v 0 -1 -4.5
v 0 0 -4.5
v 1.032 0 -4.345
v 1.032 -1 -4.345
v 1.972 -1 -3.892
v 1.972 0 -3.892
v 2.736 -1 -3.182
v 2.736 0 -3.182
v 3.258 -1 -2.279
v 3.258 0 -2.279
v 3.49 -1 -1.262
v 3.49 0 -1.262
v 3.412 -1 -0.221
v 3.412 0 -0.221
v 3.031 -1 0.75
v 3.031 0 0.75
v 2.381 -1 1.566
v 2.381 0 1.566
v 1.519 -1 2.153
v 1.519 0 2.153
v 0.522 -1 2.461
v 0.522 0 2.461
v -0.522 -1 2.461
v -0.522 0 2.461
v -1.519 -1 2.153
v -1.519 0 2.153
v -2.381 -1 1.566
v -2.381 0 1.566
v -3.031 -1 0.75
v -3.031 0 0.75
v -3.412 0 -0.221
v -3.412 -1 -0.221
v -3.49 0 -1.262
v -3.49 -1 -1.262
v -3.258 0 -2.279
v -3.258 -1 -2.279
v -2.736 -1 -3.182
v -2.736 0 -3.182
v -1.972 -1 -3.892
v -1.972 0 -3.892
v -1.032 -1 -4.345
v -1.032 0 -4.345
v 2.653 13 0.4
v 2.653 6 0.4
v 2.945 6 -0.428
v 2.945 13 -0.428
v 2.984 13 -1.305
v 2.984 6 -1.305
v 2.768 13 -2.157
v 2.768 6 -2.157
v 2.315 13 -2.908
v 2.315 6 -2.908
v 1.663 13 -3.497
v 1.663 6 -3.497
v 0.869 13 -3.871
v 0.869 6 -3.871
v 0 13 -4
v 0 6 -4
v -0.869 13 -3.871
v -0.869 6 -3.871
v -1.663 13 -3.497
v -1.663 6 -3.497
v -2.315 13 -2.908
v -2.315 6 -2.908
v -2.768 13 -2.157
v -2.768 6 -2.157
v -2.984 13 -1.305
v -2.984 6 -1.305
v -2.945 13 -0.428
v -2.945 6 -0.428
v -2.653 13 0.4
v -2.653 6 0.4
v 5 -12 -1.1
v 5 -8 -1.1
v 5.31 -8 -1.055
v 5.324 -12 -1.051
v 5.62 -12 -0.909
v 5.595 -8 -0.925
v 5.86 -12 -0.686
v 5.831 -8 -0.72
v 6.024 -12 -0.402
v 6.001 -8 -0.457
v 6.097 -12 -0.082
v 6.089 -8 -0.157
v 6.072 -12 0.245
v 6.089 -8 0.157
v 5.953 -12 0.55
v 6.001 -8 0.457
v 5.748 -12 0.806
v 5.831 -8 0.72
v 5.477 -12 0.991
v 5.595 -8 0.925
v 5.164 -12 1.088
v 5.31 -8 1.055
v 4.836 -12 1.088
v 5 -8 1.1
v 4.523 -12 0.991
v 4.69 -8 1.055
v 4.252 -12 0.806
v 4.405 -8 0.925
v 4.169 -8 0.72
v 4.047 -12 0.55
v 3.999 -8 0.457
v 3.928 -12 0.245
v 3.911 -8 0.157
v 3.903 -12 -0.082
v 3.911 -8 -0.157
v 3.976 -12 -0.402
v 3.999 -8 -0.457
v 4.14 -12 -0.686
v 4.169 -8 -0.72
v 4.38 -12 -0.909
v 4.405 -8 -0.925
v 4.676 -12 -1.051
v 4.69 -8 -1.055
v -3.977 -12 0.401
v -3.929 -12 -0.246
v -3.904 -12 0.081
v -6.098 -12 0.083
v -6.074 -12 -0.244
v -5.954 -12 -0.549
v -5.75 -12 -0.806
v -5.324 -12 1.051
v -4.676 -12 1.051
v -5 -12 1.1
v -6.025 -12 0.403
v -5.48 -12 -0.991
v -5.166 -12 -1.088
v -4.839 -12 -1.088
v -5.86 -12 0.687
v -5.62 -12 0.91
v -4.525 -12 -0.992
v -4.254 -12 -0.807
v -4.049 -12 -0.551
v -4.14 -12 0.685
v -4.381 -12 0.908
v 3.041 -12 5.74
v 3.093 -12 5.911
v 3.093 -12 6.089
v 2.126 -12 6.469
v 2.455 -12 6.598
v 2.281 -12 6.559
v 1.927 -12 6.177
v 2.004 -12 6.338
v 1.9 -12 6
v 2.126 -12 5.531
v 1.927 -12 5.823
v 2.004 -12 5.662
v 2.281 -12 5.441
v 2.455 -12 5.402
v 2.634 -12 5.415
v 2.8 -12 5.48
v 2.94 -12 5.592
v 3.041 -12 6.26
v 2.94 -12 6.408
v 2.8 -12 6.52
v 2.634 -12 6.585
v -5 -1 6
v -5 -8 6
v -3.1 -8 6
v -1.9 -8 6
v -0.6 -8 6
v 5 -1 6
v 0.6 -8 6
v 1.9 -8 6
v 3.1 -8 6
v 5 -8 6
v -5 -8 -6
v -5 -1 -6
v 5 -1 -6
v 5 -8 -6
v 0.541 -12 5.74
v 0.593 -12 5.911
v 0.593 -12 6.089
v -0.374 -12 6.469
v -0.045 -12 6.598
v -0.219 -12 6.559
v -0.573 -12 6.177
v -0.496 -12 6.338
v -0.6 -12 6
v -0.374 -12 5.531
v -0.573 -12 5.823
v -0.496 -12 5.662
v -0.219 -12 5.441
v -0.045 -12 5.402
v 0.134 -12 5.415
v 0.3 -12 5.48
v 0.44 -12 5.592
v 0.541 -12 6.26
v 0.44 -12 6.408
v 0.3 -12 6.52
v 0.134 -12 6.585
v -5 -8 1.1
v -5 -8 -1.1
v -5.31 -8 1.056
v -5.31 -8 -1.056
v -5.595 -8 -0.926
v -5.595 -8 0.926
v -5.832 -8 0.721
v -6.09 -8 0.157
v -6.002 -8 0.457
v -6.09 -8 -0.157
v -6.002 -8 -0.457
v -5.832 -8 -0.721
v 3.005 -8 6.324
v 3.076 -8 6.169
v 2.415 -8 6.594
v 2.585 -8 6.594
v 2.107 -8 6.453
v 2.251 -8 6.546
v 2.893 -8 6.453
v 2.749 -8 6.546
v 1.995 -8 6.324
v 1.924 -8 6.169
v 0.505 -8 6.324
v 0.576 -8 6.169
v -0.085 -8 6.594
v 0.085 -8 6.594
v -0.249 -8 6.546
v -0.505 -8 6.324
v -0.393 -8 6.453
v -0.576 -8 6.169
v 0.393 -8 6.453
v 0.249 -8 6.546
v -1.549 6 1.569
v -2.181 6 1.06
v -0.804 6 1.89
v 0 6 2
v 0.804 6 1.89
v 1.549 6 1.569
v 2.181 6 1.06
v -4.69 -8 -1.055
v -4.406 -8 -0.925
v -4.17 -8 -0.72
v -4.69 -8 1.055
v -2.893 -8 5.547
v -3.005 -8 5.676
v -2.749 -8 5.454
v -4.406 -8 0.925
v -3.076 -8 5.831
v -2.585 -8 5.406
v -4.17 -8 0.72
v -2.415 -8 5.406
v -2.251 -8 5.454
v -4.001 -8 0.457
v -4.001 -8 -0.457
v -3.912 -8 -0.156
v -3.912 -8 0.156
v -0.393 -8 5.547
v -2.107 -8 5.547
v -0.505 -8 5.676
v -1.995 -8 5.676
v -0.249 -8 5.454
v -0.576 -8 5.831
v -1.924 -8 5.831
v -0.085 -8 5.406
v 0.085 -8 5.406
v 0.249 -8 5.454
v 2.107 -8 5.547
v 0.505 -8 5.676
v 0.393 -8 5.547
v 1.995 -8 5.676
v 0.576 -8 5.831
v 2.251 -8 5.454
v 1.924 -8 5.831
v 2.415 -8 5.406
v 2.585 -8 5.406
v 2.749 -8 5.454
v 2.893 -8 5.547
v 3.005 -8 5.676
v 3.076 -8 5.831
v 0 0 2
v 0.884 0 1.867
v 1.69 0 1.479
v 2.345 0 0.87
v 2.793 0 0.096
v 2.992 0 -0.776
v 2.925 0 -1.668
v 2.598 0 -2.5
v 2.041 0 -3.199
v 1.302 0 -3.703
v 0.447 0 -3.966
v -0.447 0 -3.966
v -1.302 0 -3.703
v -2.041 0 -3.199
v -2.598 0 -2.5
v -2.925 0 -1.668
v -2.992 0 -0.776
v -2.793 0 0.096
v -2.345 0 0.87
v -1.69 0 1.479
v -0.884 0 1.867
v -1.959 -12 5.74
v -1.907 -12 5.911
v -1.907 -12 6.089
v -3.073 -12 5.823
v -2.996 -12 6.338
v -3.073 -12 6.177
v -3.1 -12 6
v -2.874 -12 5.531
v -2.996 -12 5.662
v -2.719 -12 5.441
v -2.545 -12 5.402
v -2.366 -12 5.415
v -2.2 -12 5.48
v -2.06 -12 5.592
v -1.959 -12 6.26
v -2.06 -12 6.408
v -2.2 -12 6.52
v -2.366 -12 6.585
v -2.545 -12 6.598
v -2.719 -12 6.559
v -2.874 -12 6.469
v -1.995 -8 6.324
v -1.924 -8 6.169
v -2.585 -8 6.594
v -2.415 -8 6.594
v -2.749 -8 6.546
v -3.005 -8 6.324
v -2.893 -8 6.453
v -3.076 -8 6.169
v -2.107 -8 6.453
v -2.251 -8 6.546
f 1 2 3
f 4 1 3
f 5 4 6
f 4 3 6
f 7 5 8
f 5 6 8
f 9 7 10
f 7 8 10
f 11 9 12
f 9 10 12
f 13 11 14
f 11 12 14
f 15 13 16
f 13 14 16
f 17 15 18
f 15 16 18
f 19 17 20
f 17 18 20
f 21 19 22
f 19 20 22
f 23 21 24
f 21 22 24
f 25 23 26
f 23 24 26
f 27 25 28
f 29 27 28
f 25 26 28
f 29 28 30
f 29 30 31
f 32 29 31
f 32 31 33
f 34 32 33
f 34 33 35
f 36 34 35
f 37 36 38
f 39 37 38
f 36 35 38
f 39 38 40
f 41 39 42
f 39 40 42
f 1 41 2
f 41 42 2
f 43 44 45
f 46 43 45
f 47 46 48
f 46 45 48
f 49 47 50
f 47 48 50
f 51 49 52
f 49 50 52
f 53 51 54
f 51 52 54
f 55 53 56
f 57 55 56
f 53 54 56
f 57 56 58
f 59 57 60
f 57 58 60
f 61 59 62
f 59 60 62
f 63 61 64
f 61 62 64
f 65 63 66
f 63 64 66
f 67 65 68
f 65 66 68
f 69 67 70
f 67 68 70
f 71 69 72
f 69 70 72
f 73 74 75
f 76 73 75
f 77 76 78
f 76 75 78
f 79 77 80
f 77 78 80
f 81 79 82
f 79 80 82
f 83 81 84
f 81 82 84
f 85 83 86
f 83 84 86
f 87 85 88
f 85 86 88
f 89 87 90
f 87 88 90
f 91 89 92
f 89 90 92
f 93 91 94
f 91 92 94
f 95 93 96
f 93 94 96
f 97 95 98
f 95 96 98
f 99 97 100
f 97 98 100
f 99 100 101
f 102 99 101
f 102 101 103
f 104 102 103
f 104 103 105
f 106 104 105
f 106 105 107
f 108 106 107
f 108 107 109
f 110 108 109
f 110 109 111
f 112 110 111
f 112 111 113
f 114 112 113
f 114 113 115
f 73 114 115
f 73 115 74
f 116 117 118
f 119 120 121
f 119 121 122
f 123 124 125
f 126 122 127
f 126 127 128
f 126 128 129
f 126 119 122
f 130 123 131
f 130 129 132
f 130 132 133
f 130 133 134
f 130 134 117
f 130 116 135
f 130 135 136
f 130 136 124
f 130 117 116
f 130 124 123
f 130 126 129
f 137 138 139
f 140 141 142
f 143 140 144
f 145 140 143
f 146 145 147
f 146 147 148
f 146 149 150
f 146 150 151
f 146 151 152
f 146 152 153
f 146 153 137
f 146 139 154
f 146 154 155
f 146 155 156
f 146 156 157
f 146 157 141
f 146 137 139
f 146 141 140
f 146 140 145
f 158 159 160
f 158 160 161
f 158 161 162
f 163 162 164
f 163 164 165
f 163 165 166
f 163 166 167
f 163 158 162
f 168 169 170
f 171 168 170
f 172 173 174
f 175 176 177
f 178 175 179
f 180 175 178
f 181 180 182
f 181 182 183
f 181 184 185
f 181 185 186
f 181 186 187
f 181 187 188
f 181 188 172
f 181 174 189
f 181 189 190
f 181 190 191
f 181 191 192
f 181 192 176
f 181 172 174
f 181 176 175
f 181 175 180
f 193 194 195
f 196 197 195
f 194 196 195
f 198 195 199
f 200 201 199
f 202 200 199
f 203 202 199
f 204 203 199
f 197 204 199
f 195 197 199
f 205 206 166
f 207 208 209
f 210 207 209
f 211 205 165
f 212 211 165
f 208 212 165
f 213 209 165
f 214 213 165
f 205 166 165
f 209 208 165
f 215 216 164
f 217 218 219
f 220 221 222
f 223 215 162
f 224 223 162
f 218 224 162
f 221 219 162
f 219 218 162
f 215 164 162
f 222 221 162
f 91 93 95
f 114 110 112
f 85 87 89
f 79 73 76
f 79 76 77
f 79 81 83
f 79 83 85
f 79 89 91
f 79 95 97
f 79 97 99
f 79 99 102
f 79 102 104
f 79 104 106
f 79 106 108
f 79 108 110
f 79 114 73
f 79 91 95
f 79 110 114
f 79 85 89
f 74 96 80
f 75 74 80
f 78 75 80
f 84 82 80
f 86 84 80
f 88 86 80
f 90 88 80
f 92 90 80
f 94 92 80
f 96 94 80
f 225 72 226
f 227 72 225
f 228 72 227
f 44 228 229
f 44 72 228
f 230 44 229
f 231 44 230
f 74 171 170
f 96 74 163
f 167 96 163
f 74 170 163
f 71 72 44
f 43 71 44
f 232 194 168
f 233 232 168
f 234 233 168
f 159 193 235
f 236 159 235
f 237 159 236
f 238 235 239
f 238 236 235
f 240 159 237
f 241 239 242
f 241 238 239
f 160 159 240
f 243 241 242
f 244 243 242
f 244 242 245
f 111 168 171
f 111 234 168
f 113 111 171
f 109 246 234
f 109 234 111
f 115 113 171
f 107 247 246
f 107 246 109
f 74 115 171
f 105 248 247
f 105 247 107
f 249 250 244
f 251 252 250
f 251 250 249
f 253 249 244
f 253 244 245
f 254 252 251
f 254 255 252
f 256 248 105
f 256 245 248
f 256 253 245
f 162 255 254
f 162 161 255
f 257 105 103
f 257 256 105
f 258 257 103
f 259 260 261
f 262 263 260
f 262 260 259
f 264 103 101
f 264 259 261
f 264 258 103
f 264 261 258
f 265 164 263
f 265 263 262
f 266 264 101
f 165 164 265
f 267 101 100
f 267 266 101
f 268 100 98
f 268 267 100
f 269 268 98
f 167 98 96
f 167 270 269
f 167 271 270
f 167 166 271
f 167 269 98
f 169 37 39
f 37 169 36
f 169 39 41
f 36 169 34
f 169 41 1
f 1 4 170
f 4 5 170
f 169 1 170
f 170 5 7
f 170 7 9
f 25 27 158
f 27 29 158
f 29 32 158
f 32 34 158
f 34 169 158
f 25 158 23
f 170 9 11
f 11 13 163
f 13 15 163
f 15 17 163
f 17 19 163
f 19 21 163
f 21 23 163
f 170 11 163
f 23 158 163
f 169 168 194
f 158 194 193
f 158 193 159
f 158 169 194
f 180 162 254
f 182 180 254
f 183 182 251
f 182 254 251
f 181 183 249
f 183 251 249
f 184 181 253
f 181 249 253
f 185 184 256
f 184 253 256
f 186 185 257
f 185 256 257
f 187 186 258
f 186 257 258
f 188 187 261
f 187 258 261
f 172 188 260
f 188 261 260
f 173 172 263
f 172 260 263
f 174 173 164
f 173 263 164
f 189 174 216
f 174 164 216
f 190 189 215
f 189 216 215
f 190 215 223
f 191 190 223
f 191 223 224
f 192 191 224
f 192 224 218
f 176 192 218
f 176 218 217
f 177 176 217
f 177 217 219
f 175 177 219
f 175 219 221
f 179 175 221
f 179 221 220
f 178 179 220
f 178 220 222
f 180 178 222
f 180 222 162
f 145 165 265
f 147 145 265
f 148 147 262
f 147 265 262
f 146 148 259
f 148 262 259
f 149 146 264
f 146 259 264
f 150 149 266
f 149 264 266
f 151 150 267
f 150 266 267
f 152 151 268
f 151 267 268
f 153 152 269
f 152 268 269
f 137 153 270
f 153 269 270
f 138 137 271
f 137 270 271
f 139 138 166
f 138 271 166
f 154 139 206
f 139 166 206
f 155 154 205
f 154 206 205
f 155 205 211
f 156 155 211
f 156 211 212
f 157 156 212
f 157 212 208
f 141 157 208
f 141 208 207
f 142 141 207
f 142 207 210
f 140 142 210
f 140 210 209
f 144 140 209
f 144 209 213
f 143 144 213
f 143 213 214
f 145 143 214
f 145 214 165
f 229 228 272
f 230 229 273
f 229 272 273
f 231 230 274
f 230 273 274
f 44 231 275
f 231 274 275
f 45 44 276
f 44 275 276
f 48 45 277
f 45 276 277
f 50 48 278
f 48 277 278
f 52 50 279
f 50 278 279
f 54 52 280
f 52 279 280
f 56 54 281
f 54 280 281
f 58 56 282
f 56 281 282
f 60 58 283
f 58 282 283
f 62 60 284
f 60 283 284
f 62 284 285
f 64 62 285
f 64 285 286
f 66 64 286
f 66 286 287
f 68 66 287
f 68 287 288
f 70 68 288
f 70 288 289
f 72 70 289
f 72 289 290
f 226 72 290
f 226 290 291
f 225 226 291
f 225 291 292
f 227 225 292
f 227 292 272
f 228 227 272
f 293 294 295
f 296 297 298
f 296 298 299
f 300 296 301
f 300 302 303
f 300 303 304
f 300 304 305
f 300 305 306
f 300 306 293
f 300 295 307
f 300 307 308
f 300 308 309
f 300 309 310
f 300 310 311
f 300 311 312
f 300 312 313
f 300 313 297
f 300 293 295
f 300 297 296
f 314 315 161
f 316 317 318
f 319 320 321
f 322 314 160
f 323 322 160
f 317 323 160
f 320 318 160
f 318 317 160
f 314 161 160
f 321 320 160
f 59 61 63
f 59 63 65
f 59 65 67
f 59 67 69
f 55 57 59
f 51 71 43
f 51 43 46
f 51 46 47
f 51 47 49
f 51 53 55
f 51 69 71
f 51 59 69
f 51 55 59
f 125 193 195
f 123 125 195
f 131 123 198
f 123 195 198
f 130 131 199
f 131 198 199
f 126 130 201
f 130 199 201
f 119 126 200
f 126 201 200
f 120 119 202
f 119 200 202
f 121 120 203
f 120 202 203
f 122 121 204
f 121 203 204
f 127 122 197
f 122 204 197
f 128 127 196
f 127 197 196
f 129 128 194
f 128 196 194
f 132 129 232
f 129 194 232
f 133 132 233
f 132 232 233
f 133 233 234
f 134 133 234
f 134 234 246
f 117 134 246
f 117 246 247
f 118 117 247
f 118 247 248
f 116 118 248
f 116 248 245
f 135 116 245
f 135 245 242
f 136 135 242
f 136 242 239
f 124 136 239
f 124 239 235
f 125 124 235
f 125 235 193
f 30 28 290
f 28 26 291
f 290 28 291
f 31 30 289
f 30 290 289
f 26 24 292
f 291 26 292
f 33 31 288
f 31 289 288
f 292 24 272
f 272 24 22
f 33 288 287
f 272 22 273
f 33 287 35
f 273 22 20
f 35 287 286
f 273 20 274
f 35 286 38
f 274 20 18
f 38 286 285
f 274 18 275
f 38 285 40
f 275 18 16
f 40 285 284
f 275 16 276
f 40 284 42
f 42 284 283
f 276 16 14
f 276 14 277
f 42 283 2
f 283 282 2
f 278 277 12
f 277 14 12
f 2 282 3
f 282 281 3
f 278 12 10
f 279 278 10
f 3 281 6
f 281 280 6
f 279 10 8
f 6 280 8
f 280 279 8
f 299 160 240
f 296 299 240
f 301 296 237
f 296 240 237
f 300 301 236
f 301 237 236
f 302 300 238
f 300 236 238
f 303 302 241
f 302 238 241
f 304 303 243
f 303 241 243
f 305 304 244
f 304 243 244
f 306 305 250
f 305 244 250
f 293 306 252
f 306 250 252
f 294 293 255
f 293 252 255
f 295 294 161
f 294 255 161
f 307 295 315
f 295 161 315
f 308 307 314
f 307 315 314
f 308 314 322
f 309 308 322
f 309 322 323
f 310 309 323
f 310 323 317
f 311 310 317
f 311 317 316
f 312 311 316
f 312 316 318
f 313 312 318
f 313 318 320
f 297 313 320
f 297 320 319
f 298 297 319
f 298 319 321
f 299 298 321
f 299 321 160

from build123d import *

# Parameters (mm, degrees)
SKETCH1_R           = 3
BOSS_EXTRUDE1_DEPTH = 6
BOSS_EXTRUDE2_DEPTH = 7
SKETCH3_R           = 3.5
BOSS_EXTRUDE3_DEPTH = 1
SKETCH4_W           = 10
SKETCH4_H           = 12
BOSS_EXTRUDE4_DEPTH = 7
SKETCH5_R           = 1.1
BOSS_EXTRUDE5_DEPTH = 4
SKETCH6_R           = 0.6
BOSS_EXTRUDE6_DEPTH = 4


with BuildPart() as part:
    # Sketch1 → Boss-Extrude1 (new body)
    with BuildSketch(Plane(origin=(0, 0, 0), x_dir=(1, 0, 0), z_dir=(0, 1, 0))):
        with Locations(Location((0, 1, 0), (0, 0, 270))):
            Circle(SKETCH1_R)
    extrude(amount=BOSS_EXTRUDE1_DEPTH)

    # Sketch2 → Boss-Extrude2 (add)
    with BuildSketch(Plane(origin=(0, 6, 0), x_dir=(1, 0, 0), z_dir=(0, 1, 0))):
        with BuildLine():
            Line((-2.653299832, -0.4), (2.653299832, -0.4))
            ThreePointArc((2.653299832, -0.4), (0, 4), (-2.653299832, -0.4))
        make_face()
    extrude(amount=BOSS_EXTRUDE2_DEPTH)

    # Sketch3 → Boss-Extrude3 (add)
    with BuildSketch(Plane.XZ):
        with Locations(Location((0, -1, 0), (0, 0, 270))):
            Circle(SKETCH3_R)
    extrude(amount=BOSS_EXTRUDE3_DEPTH)

    # Sketch4 → Boss-Extrude4 (add)
    with BuildSketch(Plane.XZ.offset(1)):
        Rectangle(SKETCH4_W, SKETCH4_H)
    extrude(amount=BOSS_EXTRUDE4_DEPTH)

    # Sketch5 → Boss-Extrude5 (add)
    with BuildSketch(Plane.XZ.offset(8)):
        with Locations(Location((-5.001245267, 0, 0), (0, 0, 89.93513768))):
            Circle(SKETCH5_R)
        with Locations(Location((5, 0, 0), (0, 0, 270))):
            Circle(SKETCH5_R)
    extrude(amount=BOSS_EXTRUDE5_DEPTH)

    # Sketch6 → Boss-Extrude6 (add)
    with BuildSketch(Plane.XZ.offset(8)):
        with Locations(Location((0, 6, 0), (0, 0, 180))):
            Circle(SKETCH6_R)
        with Locations(Location((2.5, 6, 0), (0, 0, 180))):
            Circle(SKETCH6_R)
        with Locations(Location((-2.5, 6, 0), (0, 0, 180))):
            Circle(SKETCH6_R)
    extrude(amount=BOSS_EXTRUDE6_DEPTH)


solid = part.part
